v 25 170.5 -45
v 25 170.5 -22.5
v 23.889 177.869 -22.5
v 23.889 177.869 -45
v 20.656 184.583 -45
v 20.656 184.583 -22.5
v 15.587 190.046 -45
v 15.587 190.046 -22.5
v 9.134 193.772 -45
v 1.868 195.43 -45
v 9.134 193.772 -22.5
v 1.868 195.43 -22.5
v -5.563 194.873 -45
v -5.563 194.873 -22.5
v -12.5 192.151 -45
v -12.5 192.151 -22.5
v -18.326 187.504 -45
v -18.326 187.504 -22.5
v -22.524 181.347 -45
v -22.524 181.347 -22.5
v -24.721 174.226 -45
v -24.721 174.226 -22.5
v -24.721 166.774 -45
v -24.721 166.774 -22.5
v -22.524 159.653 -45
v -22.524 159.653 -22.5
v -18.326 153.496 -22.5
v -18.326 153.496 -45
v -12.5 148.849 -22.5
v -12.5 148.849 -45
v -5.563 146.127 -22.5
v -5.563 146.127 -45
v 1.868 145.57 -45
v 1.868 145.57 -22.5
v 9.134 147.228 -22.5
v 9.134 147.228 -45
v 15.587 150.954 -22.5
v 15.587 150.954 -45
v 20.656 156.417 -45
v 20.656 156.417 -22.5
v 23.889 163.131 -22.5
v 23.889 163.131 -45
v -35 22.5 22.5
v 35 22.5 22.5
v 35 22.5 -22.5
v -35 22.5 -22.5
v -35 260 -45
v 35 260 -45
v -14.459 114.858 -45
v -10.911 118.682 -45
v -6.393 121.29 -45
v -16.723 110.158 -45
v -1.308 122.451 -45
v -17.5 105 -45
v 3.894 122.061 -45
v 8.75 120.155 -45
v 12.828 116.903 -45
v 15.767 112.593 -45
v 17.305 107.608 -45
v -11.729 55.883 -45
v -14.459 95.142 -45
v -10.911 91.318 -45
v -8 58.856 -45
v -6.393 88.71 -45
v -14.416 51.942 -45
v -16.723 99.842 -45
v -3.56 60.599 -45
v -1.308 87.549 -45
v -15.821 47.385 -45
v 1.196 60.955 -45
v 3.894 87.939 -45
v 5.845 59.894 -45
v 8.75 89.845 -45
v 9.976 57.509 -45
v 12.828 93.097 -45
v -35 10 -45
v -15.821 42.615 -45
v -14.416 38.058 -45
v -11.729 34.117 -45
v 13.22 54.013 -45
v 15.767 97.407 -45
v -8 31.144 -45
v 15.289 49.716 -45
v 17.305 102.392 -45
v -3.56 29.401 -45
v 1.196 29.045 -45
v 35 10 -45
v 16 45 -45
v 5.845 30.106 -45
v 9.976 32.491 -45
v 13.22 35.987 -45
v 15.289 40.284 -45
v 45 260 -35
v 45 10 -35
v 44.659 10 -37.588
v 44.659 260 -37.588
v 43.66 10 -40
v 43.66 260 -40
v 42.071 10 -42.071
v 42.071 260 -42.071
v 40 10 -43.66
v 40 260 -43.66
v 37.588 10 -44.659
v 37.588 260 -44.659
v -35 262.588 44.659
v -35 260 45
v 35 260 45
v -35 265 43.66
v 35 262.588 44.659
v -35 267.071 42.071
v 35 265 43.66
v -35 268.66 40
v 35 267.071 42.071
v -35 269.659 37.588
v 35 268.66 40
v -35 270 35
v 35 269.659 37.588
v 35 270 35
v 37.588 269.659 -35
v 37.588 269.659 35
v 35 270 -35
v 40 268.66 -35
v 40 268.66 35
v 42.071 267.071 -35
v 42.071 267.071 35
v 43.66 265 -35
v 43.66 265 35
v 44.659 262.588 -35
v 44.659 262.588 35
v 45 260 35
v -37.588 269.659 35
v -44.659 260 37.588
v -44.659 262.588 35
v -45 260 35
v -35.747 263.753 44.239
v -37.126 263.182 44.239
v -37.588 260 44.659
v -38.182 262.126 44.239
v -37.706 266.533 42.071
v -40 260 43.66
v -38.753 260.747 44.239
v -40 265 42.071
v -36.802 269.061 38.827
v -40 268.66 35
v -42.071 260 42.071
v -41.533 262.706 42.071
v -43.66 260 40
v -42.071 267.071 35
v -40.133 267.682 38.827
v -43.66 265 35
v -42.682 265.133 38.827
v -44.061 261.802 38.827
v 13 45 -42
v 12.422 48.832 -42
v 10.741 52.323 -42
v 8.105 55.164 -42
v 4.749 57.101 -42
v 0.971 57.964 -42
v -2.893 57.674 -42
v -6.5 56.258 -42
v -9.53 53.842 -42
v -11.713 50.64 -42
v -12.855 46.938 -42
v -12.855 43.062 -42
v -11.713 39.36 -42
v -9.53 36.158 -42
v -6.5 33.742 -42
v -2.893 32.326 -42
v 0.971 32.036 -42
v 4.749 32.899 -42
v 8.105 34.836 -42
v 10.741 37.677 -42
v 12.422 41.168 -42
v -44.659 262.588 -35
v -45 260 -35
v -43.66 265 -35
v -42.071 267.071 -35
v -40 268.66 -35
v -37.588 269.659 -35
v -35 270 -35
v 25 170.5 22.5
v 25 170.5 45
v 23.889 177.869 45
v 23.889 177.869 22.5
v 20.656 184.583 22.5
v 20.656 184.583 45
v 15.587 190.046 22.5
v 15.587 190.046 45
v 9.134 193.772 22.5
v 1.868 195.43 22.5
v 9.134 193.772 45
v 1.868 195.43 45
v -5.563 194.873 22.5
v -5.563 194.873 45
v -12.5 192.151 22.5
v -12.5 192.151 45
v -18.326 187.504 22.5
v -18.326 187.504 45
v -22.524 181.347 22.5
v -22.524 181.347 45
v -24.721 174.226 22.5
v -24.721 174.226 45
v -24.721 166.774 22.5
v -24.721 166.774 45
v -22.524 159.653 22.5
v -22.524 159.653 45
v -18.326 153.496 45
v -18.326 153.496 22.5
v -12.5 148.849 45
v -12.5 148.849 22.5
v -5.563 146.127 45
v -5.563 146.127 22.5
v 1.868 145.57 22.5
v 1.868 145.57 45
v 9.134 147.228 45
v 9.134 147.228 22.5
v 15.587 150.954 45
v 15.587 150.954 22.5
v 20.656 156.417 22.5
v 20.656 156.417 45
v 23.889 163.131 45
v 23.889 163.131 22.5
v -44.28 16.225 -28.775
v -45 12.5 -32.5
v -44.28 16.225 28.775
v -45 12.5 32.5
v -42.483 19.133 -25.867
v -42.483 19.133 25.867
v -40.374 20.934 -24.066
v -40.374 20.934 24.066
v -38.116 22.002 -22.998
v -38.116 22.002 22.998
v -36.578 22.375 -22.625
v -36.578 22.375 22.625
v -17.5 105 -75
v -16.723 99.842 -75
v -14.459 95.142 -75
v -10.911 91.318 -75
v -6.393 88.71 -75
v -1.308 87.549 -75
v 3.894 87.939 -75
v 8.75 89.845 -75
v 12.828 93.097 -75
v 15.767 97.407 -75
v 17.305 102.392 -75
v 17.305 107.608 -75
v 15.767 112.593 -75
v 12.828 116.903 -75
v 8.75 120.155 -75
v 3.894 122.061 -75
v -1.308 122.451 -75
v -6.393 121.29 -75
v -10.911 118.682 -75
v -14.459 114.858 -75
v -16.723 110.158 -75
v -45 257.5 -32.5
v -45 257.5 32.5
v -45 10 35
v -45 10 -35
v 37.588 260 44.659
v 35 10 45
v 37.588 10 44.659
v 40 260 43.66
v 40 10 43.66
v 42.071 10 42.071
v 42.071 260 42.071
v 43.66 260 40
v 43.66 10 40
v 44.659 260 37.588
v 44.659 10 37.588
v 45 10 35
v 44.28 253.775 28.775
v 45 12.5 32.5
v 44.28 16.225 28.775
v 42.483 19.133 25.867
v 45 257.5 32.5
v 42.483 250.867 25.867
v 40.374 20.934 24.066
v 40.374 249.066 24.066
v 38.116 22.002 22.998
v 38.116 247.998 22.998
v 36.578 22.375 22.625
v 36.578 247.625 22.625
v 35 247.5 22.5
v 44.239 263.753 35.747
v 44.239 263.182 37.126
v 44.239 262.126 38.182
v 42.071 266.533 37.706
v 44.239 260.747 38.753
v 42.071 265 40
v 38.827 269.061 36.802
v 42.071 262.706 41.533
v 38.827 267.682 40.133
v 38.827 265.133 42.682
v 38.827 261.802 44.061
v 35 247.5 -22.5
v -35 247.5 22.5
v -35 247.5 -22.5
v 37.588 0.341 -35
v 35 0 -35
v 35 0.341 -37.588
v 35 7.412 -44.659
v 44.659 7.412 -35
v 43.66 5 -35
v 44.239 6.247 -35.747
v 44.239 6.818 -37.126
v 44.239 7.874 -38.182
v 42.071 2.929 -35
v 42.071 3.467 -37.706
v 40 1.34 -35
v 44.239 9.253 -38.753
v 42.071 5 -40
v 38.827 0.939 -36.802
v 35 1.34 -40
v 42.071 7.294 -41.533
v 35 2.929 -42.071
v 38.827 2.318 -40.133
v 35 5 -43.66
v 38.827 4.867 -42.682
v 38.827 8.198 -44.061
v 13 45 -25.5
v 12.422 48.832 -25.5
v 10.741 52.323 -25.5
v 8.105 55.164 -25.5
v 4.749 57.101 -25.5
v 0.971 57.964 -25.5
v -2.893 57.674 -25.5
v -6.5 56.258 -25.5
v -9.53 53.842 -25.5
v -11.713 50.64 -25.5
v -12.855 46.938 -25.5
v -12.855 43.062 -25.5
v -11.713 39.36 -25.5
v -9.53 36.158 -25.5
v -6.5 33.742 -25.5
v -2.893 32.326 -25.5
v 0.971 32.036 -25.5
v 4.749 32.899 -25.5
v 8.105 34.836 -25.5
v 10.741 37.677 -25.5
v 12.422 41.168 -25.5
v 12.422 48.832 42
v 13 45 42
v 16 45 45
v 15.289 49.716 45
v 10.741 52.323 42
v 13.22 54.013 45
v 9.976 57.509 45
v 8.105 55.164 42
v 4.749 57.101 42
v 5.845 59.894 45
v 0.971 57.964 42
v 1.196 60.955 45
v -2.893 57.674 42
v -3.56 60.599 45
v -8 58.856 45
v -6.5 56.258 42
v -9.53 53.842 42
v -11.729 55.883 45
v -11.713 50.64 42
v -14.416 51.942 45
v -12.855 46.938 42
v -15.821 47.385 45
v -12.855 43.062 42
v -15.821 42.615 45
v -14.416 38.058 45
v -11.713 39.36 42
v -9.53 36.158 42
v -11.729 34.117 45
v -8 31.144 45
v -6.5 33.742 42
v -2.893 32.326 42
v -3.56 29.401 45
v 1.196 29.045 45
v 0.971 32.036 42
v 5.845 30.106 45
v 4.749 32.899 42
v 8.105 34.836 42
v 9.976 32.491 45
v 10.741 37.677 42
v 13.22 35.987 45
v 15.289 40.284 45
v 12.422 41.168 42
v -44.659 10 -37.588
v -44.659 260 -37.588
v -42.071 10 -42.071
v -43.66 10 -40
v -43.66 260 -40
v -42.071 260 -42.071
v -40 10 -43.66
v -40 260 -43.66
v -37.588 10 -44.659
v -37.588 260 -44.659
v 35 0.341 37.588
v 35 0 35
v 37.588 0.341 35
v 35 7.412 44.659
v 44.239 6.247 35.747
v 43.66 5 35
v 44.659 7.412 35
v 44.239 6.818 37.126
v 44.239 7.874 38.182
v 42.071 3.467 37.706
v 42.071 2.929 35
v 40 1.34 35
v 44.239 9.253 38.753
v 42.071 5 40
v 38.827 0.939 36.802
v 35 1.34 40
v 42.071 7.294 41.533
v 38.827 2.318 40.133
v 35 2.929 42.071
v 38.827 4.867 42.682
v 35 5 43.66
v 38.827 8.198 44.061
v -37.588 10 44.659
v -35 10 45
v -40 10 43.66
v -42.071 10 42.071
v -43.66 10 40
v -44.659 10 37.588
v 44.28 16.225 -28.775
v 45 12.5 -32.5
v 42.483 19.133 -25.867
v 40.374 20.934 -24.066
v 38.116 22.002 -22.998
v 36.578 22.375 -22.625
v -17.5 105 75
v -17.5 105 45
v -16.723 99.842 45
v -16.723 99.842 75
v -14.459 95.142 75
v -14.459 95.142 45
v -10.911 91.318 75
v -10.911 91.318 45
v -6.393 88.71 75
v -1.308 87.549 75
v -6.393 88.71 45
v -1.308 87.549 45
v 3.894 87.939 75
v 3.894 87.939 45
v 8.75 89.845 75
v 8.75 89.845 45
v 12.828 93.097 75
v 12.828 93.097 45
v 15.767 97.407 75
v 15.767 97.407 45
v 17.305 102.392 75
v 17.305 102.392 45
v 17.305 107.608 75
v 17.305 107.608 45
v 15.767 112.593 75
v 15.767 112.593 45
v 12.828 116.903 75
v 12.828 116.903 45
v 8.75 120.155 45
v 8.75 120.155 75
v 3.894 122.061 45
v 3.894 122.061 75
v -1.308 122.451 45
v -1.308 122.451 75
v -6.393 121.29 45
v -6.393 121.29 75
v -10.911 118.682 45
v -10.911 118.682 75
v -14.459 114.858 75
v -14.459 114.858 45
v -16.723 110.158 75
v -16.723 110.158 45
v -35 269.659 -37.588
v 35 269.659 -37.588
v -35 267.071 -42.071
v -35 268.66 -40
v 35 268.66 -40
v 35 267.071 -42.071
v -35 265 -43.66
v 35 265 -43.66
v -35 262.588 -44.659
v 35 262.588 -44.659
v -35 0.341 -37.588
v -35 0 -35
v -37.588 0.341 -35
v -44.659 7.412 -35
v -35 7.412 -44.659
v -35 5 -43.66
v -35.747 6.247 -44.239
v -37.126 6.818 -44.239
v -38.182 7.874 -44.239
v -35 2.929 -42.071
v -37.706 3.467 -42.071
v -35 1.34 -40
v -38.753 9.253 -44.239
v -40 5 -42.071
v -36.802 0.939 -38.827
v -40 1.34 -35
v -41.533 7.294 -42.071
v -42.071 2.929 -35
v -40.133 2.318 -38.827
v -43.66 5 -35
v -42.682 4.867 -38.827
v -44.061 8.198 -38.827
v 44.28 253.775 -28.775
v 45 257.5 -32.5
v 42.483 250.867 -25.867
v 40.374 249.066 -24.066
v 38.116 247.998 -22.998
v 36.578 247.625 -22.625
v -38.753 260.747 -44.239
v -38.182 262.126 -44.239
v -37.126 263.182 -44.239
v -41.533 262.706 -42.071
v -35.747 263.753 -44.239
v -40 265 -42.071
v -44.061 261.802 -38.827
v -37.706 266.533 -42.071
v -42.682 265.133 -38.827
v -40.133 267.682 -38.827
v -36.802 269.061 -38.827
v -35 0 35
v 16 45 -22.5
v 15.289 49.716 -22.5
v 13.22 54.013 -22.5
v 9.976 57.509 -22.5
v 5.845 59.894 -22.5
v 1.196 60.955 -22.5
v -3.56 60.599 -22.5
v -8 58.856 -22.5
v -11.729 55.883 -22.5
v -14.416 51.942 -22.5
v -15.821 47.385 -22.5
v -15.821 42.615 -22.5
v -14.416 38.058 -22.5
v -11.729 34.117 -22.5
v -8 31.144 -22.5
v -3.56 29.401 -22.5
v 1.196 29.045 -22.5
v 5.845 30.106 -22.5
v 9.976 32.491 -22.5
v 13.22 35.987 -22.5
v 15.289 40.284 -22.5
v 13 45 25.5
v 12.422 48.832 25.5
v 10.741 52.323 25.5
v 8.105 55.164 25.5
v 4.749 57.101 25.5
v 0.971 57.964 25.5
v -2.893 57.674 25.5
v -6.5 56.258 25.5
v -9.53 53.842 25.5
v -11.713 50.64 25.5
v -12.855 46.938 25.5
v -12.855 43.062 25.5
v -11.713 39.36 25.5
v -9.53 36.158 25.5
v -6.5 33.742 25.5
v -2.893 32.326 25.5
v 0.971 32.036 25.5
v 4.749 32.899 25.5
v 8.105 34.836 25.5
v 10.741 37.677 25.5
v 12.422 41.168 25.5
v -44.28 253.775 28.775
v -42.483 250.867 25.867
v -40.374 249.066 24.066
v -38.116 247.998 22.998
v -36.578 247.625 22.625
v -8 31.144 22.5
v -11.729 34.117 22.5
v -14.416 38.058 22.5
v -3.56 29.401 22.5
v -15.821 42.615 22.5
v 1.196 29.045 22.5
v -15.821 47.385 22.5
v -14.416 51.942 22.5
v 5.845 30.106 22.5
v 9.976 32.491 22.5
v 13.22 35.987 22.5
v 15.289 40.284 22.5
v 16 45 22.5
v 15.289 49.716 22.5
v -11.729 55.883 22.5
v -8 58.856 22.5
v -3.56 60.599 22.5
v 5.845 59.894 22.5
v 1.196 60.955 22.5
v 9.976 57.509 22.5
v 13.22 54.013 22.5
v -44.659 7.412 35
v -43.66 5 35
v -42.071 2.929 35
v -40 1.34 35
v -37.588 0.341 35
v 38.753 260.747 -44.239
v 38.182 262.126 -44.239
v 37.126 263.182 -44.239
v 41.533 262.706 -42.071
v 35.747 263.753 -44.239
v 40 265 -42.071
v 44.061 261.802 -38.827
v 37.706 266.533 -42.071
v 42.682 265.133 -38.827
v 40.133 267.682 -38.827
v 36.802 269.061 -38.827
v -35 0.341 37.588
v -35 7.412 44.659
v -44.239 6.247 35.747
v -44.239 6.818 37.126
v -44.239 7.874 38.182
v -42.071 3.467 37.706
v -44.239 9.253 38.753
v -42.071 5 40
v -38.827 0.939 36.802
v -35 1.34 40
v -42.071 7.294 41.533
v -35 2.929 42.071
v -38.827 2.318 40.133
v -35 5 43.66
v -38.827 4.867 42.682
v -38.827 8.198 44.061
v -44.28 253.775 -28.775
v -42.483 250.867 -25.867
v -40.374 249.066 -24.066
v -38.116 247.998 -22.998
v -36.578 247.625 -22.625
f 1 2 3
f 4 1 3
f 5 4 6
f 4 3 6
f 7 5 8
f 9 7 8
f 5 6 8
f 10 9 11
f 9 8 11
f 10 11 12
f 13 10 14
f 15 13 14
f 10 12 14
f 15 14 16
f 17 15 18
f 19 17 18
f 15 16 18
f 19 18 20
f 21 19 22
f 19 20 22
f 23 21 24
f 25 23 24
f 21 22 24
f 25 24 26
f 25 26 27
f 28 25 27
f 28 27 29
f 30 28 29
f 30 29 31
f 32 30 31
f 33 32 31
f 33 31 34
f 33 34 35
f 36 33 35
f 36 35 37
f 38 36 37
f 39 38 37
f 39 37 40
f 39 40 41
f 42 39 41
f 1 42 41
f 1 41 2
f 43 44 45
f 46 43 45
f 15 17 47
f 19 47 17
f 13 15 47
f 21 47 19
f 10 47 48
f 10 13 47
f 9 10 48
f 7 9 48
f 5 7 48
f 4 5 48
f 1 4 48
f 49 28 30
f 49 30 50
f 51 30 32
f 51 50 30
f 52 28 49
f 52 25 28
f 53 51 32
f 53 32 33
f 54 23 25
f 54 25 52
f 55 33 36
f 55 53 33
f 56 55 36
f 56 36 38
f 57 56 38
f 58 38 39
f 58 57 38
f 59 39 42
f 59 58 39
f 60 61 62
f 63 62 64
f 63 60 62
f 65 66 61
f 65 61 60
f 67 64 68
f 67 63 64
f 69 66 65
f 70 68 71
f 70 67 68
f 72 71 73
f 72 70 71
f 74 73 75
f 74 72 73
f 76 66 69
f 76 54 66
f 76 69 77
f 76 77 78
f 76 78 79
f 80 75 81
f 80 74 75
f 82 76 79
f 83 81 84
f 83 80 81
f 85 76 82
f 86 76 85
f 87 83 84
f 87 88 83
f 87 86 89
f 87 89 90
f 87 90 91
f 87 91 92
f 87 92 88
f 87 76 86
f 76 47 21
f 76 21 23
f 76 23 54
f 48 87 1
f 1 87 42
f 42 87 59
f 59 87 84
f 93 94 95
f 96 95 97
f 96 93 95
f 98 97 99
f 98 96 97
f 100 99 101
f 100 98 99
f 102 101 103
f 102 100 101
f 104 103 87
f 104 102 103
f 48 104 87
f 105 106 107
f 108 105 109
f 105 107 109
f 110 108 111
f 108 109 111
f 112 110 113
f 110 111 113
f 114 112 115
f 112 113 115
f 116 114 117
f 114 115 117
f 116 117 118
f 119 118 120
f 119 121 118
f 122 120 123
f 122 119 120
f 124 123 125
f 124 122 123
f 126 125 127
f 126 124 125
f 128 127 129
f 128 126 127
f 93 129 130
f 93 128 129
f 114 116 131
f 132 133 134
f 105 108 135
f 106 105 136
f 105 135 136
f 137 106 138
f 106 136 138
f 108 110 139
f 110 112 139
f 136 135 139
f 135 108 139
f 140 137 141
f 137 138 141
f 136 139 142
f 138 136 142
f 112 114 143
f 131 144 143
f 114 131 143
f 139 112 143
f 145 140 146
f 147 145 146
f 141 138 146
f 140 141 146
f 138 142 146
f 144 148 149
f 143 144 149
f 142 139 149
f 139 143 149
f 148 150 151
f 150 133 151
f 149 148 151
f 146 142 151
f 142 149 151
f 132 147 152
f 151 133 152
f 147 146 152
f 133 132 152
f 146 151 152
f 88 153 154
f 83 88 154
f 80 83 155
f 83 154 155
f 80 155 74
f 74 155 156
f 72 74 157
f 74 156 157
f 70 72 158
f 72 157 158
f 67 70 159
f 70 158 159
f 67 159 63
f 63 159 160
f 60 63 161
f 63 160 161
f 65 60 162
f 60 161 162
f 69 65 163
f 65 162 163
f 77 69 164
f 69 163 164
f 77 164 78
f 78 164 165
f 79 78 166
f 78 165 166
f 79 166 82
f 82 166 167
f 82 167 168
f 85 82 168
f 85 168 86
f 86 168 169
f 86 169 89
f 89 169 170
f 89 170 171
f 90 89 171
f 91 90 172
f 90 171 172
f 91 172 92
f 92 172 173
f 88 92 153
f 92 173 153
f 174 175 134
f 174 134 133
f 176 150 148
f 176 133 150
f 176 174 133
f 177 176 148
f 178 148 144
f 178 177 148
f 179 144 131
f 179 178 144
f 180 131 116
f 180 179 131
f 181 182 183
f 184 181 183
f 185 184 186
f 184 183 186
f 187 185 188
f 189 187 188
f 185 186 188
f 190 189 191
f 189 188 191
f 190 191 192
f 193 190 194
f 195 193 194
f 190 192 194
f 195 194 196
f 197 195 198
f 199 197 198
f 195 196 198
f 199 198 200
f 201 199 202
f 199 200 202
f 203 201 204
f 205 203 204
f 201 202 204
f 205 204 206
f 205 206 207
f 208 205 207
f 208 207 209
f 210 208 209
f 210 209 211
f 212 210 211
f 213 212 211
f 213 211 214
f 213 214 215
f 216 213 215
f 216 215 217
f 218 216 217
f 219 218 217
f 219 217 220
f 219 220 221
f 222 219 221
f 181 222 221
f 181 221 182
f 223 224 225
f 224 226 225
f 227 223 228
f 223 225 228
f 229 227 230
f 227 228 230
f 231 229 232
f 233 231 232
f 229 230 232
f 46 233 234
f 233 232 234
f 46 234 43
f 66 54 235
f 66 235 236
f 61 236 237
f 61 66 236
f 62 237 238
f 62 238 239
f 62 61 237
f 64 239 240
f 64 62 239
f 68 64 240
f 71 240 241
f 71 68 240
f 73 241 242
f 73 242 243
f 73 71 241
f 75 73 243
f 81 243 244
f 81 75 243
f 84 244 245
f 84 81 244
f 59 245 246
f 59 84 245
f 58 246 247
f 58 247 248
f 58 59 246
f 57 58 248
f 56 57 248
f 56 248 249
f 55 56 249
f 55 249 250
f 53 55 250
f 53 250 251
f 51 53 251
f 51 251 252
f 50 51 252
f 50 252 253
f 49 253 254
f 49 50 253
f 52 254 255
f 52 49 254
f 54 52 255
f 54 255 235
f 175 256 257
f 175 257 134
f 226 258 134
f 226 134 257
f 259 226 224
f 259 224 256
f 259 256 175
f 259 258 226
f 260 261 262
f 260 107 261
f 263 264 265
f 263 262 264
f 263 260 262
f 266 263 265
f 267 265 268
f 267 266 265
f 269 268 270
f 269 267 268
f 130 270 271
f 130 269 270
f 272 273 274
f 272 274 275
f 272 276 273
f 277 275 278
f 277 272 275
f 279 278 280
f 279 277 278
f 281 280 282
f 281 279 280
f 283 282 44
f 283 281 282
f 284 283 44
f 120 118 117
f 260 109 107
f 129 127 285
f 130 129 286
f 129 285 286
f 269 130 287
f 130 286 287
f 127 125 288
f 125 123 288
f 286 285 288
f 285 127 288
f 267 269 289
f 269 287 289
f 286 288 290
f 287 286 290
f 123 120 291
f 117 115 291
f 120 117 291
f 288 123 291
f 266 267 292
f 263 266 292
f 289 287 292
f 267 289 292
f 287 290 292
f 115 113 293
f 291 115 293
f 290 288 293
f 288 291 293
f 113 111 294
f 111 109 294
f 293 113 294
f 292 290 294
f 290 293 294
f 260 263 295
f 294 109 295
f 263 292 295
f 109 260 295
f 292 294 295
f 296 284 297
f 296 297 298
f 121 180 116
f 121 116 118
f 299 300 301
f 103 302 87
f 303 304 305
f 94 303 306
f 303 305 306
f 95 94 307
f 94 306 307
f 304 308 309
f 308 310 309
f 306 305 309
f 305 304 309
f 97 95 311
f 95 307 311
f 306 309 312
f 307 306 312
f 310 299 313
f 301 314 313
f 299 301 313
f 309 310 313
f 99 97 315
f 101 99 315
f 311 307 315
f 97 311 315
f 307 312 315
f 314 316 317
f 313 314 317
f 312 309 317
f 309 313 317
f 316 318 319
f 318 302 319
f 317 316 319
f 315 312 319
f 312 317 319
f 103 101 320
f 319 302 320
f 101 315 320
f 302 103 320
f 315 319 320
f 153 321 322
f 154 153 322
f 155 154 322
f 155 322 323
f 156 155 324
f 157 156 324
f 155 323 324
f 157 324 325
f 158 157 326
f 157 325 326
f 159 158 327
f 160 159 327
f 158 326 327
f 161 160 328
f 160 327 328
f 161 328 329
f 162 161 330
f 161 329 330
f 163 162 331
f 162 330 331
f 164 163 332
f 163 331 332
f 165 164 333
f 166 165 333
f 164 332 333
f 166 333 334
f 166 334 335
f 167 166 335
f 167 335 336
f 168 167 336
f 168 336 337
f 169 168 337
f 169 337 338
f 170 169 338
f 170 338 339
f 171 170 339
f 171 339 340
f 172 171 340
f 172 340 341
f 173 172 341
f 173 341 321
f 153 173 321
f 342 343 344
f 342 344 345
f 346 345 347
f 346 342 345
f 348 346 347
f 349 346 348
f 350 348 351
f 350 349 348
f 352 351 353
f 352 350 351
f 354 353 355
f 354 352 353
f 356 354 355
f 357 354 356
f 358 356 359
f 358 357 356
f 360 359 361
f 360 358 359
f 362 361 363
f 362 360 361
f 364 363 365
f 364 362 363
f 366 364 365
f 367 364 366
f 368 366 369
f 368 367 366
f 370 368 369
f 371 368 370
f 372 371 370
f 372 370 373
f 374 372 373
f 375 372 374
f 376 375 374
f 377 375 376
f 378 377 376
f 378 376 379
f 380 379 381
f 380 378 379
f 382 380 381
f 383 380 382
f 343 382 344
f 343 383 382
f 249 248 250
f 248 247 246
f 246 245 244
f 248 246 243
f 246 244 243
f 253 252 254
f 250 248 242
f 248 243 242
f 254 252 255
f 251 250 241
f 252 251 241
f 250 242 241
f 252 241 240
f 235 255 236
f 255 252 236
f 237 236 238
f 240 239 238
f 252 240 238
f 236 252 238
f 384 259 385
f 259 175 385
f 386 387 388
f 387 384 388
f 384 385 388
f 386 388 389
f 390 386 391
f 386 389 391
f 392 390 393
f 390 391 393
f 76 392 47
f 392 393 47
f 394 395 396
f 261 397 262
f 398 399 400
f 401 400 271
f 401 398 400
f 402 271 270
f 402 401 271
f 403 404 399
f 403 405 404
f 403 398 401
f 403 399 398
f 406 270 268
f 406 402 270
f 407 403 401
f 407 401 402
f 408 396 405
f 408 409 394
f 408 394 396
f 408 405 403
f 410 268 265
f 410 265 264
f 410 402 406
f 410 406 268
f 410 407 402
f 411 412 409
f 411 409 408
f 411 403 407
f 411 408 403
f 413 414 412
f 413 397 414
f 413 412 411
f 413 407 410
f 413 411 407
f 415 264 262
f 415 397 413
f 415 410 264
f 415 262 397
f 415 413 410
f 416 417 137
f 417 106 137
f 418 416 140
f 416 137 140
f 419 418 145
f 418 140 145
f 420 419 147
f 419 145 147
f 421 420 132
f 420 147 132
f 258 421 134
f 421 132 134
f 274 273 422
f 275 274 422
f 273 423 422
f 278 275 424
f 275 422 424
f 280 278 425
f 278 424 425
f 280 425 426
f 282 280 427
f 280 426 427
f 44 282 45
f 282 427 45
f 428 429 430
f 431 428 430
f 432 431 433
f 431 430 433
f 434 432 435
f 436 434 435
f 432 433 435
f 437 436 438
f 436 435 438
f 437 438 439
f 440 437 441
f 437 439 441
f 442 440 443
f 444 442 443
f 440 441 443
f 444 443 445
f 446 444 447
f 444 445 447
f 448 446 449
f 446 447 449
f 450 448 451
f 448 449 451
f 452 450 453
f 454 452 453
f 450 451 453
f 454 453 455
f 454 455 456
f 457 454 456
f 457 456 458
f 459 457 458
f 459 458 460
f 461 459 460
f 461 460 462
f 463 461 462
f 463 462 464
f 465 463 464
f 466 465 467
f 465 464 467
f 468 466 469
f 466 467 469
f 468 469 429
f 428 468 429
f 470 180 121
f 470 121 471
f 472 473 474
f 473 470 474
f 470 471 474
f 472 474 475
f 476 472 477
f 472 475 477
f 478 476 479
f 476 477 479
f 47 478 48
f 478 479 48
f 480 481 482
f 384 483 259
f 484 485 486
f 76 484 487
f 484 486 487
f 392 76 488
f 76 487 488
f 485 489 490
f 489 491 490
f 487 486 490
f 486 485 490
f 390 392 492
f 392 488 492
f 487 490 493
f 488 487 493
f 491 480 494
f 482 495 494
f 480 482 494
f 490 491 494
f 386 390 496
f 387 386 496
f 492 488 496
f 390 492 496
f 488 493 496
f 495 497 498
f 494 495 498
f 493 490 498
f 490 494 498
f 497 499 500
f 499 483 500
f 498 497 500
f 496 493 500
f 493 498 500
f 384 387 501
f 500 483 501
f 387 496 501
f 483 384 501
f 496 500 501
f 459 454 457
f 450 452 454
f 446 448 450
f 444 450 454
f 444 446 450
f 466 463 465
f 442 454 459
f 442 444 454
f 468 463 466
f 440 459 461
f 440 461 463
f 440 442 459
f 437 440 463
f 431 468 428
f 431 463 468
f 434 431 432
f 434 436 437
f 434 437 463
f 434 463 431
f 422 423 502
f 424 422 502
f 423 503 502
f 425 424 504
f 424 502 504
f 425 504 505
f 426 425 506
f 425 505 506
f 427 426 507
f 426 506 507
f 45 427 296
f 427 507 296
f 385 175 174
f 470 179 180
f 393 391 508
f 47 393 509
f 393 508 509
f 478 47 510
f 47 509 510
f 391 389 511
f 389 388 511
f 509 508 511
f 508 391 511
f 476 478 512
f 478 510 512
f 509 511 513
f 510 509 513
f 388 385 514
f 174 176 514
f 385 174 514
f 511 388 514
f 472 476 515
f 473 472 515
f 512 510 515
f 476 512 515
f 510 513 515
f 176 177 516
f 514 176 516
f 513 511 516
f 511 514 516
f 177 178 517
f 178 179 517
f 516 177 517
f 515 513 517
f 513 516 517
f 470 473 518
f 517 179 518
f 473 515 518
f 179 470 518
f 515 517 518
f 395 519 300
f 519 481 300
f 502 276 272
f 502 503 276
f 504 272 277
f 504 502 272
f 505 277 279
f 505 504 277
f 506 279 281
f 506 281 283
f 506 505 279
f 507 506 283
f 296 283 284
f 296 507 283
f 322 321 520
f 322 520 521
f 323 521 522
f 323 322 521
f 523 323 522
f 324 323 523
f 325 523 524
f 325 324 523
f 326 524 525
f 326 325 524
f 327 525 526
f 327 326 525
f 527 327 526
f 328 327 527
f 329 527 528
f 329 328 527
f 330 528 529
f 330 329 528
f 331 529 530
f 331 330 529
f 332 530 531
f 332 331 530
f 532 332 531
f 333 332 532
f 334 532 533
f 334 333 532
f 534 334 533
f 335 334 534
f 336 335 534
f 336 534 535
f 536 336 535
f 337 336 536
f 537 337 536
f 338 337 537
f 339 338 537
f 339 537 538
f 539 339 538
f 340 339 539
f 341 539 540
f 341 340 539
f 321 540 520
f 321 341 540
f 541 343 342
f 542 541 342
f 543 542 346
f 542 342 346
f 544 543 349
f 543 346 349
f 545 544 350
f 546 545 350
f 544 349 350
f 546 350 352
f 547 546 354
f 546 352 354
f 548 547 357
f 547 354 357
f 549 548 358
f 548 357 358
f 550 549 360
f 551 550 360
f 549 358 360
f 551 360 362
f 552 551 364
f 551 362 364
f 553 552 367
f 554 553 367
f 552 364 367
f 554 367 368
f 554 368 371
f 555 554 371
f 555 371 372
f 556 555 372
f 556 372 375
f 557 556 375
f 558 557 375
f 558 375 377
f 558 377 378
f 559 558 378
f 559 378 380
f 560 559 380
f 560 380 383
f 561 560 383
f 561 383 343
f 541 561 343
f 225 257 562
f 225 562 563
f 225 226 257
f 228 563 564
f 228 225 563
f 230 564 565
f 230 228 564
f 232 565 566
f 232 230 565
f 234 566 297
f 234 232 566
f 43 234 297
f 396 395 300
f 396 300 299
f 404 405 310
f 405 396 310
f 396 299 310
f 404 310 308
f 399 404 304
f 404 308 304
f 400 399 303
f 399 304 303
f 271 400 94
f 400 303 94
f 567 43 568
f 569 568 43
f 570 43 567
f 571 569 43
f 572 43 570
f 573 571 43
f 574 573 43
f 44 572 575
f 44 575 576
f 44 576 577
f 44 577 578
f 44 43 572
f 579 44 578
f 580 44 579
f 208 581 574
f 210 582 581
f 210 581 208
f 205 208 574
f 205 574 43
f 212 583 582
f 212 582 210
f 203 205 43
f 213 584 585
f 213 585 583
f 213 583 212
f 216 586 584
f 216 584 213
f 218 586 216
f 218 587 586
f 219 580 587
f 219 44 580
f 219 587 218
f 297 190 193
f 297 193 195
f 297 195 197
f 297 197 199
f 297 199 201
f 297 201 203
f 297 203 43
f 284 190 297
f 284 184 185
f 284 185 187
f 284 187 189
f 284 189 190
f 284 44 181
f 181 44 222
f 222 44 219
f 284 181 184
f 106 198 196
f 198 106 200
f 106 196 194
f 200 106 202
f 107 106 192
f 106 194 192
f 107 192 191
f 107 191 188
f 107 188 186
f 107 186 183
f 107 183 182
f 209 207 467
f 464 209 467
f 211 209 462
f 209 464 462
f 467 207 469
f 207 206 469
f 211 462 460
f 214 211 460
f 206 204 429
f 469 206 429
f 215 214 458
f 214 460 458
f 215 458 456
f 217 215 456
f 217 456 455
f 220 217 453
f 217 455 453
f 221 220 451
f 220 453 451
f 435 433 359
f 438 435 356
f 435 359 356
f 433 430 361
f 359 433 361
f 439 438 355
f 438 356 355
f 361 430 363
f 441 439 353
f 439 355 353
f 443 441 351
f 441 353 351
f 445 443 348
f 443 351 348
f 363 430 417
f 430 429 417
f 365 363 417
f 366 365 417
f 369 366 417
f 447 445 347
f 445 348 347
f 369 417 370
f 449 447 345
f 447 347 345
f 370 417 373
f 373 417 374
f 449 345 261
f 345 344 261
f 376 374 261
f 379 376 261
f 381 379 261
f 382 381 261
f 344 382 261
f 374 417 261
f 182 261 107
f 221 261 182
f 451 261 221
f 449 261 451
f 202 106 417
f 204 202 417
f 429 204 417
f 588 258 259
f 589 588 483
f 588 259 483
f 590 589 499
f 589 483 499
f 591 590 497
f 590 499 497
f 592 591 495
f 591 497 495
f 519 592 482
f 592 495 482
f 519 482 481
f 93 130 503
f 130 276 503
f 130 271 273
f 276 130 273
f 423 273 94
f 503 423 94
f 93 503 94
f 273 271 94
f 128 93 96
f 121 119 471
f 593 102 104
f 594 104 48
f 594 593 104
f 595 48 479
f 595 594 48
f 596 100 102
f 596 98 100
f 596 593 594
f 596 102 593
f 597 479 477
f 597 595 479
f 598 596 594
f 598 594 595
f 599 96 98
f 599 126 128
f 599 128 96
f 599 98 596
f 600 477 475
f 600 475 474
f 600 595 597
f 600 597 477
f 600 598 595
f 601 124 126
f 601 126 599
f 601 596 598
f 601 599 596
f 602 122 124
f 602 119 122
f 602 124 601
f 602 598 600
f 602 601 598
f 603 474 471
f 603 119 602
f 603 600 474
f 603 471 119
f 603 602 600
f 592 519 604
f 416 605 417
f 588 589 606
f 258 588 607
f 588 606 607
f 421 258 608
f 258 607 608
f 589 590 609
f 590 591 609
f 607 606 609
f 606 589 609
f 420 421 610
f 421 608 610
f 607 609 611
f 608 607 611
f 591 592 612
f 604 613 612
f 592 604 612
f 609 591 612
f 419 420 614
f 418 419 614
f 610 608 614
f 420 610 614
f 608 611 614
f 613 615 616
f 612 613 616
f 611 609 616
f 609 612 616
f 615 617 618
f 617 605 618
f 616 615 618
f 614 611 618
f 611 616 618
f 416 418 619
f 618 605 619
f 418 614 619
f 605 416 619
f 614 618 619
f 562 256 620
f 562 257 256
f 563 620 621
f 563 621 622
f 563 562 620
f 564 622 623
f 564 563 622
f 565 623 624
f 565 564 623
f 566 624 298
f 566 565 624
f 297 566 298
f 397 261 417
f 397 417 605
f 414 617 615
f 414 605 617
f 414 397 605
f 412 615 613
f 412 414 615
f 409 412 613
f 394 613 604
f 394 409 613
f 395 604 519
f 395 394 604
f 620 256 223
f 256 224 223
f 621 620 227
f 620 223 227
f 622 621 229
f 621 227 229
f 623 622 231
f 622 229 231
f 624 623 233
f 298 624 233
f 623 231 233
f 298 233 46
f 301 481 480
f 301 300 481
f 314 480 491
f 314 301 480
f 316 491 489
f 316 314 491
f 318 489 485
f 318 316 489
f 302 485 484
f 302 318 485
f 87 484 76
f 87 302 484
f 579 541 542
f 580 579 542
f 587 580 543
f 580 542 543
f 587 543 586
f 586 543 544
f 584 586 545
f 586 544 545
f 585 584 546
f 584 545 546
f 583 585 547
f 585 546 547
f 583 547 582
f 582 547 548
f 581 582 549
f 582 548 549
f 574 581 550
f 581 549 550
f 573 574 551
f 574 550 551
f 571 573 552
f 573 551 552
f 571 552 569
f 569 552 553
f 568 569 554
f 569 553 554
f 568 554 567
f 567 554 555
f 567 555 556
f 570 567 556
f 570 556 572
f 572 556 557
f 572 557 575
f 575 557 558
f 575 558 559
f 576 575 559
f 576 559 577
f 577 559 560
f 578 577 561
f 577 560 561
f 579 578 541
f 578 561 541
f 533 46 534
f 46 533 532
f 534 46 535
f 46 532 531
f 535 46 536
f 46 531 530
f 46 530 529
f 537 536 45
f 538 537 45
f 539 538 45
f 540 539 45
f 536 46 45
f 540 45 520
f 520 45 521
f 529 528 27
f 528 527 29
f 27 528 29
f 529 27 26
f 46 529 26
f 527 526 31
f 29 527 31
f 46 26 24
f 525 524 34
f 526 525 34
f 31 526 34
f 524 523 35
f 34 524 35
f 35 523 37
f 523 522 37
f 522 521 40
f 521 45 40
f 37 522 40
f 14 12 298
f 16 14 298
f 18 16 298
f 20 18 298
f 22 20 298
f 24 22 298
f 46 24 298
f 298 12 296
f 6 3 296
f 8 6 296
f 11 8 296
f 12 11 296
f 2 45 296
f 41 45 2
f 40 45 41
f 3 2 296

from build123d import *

# Parameters (mm, degrees)
SKETCH2_W              = 90
SKETCH2_H              = 90
BOSS_EXTRUDE1_DEPTH    = 270
SKETCH3_W              = 45
SKETCH3_H              = 225
CUT_EXTRUDE1_DEPTH     = 289.140590684
SKETCH4_R              = 25
CRANK_SHAFT_HOLE_DEPTH = 90
SKETCH5_R              = 13
CUT_EXTRUDE3_DEPTH     = 90
CHAMFER1_SIZE          = 3
SKETCH6_R              = 17.5
BOSS_EXTRUDE2_DEPTH    = 30
FILLET1_R              = 10


with BuildPart() as part:
    # Sketch2 → Boss-Extrude1 (new body)
    with BuildSketch(Plane(origin=(0, 0, 0), x_dir=(1, 0, 0), z_dir=(0, 1, 0))):
        Rectangle(SKETCH2_W, SKETCH2_H)
    extrude(amount=BOSS_EXTRUDE1_DEPTH)

    # Sketch3 → Cut-Extrude1 (cut, through all)
    with BuildSketch(Plane(origin=(45, 0, 0), x_dir=(0, 0, -1), z_dir=(1, 0, 0))):
        with Locations((0, 135)):
            Rectangle(SKETCH3_W, SKETCH3_H)
    extrude(amount=-CUT_EXTRUDE1_DEPTH, mode=Mode.SUBTRACT)

    # Sketch4 → Crank shaft hole (cut)
    with BuildSketch(Plane.XY.offset(45)):
        with Locations((0, 170.5)):
            Circle(SKETCH4_R)
    extrude(amount=-CRANK_SHAFT_HOLE_DEPTH, mode=Mode.SUBTRACT)

    # Sketch5 → Cut-Extrude3 (cut)
    with BuildSketch(Plane.XY.offset(45)):
        with Locations((0, 45)):
            Circle(SKETCH5_R)
    extrude(amount=-CUT_EXTRUDE3_DEPTH, mode=Mode.SUBTRACT)

    # Chamfer1
    chamfer1_edges = [part.edges().sort_by_distance(p)[0] for p in [
        (-13, 45, 22.5),
        (-13, 45, -45),
        (-13, 45, -22.5),
        (-13, 45, 45),
    ]]
    chamfer(chamfer1_edges, length=CHAMFER1_SIZE)

    # Sketch6 → Boss-Extrude2 (add)
    with BuildSketch(Plane.XY.offset(45)):
        with Locations(Location((0, 105, 0), (0, 0, 180))):
            Circle(SKETCH6_R)
    boss_extrude2 = extrude(amount=BOSS_EXTRUDE2_DEPTH)

    # Mirror1: Boss-Extrude2 across plane
    add(boss_extrude2.mirror(Plane.XY))

    # Fillet1
    fillet1_edges = [part.edges().sort_by_distance(p)[0] for p in [
        (-45, 270, 0),
        (0, 270, 45),
        (-45, 135, 22.5),
        (-45, 247.5, 0),
        (-45, 135, -22.5),
        (-45, 22.5, 0),
        (45, 135, 22.5),
        (45, 22.5, 0),
        (45, 135, -22.5),
        (45, 247.5, 0),
        (45, 270, 0),
        (0, 0, 45),
        (-45, 0, 0),
        (0, 0, -45),
        (45, 0, 0),
        (45, 135, 45),
        (-45, 135, 45),
        (-45, 135, -45),
        (45, 135, -45),
        (0, 270, -45),
    ]]
    fillet(fillet1_edges, radius=FILLET1_R)


solid = part.part
